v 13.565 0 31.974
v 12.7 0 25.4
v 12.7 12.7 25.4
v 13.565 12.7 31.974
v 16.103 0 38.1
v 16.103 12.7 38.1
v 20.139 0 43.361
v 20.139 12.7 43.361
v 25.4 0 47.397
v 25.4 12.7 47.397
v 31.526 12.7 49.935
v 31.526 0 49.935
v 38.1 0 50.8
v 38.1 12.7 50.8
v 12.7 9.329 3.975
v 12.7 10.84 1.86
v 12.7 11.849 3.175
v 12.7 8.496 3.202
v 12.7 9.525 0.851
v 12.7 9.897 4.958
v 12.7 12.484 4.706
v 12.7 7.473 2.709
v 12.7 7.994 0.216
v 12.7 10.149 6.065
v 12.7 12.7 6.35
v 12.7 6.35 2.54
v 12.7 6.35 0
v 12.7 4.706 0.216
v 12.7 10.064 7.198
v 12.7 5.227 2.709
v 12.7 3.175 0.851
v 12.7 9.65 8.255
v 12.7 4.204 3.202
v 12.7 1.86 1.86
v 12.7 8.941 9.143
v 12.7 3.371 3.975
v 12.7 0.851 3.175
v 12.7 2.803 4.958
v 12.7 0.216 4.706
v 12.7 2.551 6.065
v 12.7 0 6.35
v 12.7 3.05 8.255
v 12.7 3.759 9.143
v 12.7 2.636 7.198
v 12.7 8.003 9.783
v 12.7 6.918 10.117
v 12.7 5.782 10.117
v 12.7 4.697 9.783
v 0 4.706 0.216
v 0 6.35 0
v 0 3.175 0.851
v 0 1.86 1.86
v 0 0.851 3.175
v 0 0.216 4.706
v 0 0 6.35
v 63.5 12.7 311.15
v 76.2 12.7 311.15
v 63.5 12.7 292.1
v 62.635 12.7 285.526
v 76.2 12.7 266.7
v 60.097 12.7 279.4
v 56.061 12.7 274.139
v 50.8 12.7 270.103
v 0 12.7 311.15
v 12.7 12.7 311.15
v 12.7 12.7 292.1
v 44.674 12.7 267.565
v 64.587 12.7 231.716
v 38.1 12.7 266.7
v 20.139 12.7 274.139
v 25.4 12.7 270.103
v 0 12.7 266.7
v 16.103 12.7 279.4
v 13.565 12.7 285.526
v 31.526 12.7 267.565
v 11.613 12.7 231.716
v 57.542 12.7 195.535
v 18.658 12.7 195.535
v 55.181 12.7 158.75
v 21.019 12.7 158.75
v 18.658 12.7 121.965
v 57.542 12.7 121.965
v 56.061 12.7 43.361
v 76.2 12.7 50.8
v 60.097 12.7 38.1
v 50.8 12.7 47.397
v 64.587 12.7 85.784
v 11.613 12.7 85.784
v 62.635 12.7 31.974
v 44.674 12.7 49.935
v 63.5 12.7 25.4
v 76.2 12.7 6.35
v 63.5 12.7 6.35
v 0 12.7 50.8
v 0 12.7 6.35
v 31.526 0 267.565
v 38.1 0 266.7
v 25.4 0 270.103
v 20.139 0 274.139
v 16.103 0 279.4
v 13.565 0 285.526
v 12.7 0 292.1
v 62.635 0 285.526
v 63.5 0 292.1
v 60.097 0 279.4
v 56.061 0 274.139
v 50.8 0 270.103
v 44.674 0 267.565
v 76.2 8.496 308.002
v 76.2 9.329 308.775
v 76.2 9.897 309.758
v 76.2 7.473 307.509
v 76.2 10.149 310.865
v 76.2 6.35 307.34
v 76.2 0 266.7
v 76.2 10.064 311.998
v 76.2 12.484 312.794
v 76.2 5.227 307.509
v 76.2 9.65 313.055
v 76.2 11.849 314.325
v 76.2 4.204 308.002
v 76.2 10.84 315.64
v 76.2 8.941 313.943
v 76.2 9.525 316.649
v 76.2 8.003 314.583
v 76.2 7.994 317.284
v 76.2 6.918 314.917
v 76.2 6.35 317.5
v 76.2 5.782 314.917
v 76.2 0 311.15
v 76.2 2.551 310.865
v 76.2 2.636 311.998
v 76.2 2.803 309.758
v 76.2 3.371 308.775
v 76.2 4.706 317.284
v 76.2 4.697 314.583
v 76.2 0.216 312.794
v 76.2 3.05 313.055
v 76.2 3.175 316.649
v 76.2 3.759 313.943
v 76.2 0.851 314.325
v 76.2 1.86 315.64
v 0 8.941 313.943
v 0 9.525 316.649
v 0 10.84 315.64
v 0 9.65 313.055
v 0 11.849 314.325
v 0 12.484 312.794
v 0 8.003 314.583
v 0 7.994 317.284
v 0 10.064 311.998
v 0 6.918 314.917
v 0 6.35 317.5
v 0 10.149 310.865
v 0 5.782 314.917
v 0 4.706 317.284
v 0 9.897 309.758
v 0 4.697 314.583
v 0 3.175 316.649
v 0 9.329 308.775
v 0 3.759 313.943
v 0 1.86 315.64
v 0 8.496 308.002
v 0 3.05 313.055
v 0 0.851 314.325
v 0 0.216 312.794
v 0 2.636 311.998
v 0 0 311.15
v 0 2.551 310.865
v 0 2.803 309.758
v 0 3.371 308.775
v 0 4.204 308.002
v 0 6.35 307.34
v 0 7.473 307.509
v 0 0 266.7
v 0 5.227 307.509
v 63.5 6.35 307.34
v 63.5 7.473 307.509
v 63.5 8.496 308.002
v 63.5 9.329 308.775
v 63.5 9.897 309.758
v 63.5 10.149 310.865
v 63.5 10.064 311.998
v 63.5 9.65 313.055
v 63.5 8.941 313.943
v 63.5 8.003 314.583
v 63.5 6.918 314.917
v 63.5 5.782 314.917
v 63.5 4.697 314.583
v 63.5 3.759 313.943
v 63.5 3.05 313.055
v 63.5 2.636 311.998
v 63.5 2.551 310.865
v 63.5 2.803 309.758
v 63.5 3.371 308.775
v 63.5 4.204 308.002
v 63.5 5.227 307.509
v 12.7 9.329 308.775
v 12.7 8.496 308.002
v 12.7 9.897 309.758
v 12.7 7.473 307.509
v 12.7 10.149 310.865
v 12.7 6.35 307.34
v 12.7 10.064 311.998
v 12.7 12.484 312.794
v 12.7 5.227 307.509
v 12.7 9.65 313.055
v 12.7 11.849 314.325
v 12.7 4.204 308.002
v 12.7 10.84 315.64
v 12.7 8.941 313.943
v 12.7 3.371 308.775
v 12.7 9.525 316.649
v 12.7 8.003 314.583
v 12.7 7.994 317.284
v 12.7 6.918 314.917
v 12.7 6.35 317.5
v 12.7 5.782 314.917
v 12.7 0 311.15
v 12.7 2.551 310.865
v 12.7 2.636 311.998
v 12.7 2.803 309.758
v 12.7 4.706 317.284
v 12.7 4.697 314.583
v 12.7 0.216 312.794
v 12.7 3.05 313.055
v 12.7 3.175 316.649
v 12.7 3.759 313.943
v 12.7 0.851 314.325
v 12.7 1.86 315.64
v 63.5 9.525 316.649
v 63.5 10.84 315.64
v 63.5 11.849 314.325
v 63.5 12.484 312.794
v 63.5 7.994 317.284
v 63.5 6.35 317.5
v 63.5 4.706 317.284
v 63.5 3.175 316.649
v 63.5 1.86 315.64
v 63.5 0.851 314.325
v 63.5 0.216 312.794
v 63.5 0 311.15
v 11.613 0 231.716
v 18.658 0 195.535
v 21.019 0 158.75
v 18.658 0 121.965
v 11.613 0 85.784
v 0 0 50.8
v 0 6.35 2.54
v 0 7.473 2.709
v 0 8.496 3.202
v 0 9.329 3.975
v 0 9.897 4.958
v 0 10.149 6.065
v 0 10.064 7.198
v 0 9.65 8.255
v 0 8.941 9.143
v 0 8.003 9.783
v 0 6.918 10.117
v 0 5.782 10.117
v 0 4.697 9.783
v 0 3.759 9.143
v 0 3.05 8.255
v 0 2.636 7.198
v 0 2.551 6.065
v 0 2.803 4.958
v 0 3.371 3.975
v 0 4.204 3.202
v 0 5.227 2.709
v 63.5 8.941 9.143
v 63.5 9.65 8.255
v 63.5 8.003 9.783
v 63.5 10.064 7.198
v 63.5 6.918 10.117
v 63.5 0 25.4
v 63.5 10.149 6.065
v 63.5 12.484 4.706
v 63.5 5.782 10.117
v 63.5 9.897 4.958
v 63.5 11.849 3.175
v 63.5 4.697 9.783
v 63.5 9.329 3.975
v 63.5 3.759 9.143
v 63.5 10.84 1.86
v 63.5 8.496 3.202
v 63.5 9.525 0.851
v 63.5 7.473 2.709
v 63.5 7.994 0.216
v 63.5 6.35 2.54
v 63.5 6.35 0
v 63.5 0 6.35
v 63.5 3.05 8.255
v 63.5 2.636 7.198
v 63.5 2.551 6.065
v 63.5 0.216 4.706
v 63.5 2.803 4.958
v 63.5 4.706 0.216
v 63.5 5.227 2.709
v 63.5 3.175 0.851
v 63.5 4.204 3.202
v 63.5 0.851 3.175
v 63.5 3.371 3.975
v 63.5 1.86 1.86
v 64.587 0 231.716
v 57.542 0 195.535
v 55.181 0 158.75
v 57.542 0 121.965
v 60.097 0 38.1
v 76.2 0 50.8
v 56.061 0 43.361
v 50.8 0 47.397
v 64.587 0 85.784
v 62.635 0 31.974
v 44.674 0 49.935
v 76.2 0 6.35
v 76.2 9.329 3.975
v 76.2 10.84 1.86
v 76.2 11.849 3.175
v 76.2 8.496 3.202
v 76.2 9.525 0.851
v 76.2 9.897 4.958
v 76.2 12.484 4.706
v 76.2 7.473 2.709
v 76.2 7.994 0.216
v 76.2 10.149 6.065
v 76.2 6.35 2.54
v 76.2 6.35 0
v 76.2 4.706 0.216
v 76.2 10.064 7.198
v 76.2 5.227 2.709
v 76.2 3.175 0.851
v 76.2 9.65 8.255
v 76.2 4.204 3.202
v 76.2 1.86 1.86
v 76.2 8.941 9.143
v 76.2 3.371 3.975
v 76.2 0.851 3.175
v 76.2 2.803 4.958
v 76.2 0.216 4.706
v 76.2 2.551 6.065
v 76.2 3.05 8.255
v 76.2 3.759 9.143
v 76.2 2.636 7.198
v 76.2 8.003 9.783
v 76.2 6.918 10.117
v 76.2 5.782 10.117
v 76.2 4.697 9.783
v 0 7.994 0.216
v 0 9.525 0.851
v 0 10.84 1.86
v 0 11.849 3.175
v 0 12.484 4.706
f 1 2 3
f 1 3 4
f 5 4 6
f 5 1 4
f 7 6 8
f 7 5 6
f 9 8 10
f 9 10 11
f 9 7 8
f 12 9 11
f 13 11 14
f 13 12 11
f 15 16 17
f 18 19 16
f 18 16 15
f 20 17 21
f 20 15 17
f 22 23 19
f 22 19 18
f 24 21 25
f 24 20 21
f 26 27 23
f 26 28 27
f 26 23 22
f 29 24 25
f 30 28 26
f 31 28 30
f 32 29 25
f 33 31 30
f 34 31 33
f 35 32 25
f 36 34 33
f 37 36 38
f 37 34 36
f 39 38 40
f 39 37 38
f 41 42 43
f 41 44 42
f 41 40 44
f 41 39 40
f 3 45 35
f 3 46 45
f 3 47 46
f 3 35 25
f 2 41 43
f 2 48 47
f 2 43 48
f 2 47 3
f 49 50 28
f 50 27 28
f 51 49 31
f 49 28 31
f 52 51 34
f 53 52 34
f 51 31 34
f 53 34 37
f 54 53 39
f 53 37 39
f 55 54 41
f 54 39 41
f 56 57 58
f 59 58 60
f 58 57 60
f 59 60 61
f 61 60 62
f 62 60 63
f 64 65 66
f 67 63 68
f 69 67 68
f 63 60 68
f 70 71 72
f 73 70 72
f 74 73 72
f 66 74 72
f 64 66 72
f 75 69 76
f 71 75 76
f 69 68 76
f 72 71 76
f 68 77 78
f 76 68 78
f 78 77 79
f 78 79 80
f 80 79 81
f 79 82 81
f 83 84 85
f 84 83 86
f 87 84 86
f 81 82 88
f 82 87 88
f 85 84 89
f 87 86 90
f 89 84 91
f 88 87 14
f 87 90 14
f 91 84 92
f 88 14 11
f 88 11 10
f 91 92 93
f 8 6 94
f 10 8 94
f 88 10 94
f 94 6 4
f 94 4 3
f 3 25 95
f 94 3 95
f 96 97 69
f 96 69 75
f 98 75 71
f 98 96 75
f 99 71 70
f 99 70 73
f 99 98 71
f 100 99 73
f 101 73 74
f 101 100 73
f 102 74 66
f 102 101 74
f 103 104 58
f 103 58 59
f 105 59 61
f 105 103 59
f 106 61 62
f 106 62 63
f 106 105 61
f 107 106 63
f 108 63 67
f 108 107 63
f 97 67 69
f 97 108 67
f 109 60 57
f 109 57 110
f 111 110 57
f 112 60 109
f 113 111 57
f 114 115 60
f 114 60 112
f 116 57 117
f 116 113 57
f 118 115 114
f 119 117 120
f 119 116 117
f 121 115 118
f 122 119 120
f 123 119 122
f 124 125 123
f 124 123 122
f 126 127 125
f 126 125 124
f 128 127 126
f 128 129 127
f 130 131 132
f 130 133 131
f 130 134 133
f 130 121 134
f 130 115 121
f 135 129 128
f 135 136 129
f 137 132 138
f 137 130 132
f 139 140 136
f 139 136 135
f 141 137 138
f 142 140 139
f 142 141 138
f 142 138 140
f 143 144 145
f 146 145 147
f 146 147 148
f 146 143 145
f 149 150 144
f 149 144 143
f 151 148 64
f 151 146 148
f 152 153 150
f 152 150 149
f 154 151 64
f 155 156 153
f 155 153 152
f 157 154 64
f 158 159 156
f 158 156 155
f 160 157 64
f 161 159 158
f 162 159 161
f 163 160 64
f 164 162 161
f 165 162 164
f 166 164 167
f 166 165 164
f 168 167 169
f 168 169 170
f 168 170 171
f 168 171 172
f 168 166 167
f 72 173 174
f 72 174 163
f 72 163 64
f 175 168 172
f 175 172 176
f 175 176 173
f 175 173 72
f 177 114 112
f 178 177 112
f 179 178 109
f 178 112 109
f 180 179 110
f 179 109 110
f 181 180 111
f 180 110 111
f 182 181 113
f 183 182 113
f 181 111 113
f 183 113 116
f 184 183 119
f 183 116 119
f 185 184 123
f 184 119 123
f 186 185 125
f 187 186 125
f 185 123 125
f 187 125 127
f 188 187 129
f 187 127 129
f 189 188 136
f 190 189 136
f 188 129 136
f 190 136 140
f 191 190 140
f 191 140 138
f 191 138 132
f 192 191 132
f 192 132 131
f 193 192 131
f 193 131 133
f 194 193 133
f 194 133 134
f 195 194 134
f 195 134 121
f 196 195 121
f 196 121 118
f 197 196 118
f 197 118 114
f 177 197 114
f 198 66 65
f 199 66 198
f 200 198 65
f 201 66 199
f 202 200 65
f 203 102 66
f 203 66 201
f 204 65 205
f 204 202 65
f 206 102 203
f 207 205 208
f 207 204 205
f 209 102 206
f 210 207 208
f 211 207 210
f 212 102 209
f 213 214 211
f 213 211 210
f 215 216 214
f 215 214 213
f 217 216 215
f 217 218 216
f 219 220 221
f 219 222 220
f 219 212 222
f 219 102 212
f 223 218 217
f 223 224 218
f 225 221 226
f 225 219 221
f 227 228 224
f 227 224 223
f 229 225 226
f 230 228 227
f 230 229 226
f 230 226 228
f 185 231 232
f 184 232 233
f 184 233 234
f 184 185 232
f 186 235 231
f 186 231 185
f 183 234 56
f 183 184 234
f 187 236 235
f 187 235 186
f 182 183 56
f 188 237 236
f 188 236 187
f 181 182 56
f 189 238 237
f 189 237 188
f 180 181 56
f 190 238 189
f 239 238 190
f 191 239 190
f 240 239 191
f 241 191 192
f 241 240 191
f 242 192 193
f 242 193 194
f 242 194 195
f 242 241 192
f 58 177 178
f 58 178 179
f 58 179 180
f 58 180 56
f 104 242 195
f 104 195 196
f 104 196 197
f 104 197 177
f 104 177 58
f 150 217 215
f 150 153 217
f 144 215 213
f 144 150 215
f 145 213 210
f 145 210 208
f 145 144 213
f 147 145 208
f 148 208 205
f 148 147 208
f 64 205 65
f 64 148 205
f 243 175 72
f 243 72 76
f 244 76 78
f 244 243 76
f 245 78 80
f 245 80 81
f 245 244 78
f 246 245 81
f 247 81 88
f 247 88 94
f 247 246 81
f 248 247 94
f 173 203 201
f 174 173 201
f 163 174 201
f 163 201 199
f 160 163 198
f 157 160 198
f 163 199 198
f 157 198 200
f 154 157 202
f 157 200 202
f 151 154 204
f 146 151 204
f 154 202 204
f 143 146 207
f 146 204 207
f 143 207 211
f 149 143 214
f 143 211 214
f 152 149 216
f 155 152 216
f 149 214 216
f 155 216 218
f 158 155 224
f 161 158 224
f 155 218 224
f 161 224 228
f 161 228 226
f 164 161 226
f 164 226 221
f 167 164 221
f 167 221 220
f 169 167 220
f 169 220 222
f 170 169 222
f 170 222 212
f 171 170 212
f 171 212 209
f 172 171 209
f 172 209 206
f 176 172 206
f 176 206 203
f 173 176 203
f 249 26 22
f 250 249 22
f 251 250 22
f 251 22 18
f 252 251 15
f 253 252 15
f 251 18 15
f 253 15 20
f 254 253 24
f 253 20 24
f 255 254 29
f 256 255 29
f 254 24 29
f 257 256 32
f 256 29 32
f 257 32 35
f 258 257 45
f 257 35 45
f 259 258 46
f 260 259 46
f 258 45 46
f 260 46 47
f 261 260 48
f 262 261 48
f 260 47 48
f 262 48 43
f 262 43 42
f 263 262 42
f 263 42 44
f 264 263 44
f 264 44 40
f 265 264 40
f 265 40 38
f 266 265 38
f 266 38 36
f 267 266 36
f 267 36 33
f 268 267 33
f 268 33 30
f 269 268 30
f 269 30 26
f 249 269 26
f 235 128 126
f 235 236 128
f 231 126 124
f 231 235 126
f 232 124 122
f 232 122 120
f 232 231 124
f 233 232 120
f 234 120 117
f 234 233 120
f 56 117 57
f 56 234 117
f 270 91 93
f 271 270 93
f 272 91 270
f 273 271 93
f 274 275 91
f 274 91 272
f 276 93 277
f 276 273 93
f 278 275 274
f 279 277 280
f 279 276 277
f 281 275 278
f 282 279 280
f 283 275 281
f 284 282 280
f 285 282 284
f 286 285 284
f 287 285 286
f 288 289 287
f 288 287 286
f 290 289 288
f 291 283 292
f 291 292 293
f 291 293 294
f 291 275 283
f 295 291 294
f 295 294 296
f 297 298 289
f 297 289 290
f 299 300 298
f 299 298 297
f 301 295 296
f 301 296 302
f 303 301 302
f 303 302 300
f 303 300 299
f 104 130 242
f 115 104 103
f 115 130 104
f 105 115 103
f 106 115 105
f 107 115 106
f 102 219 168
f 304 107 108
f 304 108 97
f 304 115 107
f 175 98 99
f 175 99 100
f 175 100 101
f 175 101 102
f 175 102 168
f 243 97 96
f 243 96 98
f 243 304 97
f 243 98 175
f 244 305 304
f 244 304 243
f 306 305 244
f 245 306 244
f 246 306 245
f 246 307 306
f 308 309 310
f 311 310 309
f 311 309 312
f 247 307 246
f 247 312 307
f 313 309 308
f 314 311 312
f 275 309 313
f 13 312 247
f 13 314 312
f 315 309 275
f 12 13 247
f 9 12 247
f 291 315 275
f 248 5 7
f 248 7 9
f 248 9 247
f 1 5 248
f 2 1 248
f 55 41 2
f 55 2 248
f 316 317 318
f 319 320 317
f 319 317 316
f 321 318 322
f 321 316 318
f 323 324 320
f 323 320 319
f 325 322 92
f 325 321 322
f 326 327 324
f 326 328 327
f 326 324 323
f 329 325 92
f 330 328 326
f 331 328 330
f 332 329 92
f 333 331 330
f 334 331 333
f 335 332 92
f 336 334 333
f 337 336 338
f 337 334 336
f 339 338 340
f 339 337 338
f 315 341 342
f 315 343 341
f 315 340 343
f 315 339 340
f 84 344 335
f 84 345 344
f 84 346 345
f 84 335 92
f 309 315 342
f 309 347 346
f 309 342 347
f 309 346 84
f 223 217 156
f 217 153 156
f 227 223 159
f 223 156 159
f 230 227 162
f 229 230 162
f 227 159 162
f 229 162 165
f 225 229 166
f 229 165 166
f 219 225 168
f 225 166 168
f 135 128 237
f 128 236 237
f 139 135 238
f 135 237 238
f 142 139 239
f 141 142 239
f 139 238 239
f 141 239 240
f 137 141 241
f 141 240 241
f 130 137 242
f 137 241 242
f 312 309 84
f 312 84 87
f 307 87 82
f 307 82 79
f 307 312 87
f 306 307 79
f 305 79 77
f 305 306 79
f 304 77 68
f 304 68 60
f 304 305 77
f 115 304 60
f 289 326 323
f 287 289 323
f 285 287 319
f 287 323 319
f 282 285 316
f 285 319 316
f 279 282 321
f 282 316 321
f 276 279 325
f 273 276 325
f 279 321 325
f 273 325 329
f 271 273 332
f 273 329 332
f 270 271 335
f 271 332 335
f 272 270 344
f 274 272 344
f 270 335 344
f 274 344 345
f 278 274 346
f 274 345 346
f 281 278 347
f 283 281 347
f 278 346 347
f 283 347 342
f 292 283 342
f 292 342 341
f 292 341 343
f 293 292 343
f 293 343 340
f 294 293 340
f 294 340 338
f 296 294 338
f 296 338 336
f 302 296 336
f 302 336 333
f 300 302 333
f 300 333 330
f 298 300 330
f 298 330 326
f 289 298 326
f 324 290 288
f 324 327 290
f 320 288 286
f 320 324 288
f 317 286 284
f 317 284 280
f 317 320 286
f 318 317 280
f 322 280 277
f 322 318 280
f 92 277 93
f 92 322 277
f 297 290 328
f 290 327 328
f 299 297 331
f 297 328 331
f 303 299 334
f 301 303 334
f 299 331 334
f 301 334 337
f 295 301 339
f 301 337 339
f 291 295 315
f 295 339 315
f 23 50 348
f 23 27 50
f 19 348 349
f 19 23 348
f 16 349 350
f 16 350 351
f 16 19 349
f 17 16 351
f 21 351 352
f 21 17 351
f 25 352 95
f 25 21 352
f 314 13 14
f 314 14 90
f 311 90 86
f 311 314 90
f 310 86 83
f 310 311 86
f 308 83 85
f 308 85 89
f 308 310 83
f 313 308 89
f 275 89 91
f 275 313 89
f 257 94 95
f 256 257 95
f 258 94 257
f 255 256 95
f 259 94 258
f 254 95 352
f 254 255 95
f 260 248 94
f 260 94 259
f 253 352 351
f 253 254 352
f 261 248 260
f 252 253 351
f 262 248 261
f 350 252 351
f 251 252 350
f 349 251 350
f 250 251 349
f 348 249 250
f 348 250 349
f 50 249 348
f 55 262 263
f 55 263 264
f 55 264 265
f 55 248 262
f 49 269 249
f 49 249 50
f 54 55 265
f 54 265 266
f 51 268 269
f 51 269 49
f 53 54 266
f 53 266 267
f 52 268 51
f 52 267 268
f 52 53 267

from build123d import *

# Parameters (mm, degrees)
BOSS_EXTRUDE1_DEPTH = 12.7
FILLET1_R           = 6.35
SKETCH2_R           = 3.81
CUT_EXTRUDE1_DEPTH  = 327.762880389
SKETCH3_R           = 3.81
CUT_EXTRUDE2_DEPTH  = 327.762880389


with BuildPart() as part:
    # Sketch1 → Boss-Extrude1 (new body)
    with BuildSketch(Plane(origin=(0, 0, 0), x_dir=(1, 0, 0), z_dir=(0, 1, 0))):
        with BuildLine():
            Line((0, 0), (12.7, 0))
            Line((12.7, 0), (12.7, -25.4))
            ThreePointArc((12.7, -25.4), (20.139487758, -43.360512242), (38.1, -50.8))
            ThreePointArc((38.1, -50.8), (56.060512242, -43.360512242), (63.5, -25.4))
            Line((63.5, -25.4), (63.5, 0))
            Line((63.5, 0), (76.2, 0))
            Line((76.2, 0), (76.2, -50.8))
            ThreePointArc((76.2, -50.8), (55.181226716, -158.75), (76.2, -266.7))
            Line((76.2, -266.7), (76.2, -317.5))
            Line((76.2, -317.5), (63.5, -317.5))
            Line((63.5, -317.5), (63.5, -292.1))
            ThreePointArc((63.5, -292.1), (56.060512242, -274.139487758), (38.1, -266.7))
            ThreePointArc((38.1, -266.7), (20.139487758, -274.139487758), (12.7, -292.1))
            Line((12.7, -292.1), (12.7, -317.5))
            Line((12.7, -317.5), (0, -317.5))
            Line((0, -317.5), (0, -266.7))
            ThreePointArc((0, -266.7), (21.018773284, -158.75), (0, -50.8))
            Line((0, -50.8), (0, 0))
        make_face()
    extrude(amount=BOSS_EXTRUDE1_DEPTH)

    # Fillet1
    fillet1_edges = [part.edges().sort_by_distance(p)[0] for p in [
        (69.85, 0, 0),
        (6.35, 0, 0),
        (69.85, 12.7, 0),
        (6.35, 12.7, 0),
        (6.35, 0, 317.5),
        (6.35, 12.7, 317.5),
        (69.85, 0, 317.5),
        (69.85, 12.7, 317.5),
    ]]
    fillet(fillet1_edges, radius=FILLET1_R - 0.0001)  # a hair under: the kernel refuses the full size

    # Sketch2 → Cut-Extrude1 (cut, through all)
    with BuildSketch(Plane(origin=(76.2, 0, 0), x_dir=(0, 0, -1), z_dir=(1, 0, 0))):
        with Locations((-311.15, 6.35)):
            Circle(SKETCH2_R)
    extrude(amount=-CUT_EXTRUDE1_DEPTH, mode=Mode.SUBTRACT)

    # Sketch3 → Cut-Extrude2 (cut, through all)
    with BuildSketch(Plane(origin=(76.2, 0, 0), x_dir=(0, 0, -1), z_dir=(1, 0, 0))):
        with Locations((-6.35, 6.35)):
            Circle(SKETCH3_R)
    extrude(amount=-CUT_EXTRUDE2_DEPTH, mode=Mode.SUBTRACT)


solid = part.part
